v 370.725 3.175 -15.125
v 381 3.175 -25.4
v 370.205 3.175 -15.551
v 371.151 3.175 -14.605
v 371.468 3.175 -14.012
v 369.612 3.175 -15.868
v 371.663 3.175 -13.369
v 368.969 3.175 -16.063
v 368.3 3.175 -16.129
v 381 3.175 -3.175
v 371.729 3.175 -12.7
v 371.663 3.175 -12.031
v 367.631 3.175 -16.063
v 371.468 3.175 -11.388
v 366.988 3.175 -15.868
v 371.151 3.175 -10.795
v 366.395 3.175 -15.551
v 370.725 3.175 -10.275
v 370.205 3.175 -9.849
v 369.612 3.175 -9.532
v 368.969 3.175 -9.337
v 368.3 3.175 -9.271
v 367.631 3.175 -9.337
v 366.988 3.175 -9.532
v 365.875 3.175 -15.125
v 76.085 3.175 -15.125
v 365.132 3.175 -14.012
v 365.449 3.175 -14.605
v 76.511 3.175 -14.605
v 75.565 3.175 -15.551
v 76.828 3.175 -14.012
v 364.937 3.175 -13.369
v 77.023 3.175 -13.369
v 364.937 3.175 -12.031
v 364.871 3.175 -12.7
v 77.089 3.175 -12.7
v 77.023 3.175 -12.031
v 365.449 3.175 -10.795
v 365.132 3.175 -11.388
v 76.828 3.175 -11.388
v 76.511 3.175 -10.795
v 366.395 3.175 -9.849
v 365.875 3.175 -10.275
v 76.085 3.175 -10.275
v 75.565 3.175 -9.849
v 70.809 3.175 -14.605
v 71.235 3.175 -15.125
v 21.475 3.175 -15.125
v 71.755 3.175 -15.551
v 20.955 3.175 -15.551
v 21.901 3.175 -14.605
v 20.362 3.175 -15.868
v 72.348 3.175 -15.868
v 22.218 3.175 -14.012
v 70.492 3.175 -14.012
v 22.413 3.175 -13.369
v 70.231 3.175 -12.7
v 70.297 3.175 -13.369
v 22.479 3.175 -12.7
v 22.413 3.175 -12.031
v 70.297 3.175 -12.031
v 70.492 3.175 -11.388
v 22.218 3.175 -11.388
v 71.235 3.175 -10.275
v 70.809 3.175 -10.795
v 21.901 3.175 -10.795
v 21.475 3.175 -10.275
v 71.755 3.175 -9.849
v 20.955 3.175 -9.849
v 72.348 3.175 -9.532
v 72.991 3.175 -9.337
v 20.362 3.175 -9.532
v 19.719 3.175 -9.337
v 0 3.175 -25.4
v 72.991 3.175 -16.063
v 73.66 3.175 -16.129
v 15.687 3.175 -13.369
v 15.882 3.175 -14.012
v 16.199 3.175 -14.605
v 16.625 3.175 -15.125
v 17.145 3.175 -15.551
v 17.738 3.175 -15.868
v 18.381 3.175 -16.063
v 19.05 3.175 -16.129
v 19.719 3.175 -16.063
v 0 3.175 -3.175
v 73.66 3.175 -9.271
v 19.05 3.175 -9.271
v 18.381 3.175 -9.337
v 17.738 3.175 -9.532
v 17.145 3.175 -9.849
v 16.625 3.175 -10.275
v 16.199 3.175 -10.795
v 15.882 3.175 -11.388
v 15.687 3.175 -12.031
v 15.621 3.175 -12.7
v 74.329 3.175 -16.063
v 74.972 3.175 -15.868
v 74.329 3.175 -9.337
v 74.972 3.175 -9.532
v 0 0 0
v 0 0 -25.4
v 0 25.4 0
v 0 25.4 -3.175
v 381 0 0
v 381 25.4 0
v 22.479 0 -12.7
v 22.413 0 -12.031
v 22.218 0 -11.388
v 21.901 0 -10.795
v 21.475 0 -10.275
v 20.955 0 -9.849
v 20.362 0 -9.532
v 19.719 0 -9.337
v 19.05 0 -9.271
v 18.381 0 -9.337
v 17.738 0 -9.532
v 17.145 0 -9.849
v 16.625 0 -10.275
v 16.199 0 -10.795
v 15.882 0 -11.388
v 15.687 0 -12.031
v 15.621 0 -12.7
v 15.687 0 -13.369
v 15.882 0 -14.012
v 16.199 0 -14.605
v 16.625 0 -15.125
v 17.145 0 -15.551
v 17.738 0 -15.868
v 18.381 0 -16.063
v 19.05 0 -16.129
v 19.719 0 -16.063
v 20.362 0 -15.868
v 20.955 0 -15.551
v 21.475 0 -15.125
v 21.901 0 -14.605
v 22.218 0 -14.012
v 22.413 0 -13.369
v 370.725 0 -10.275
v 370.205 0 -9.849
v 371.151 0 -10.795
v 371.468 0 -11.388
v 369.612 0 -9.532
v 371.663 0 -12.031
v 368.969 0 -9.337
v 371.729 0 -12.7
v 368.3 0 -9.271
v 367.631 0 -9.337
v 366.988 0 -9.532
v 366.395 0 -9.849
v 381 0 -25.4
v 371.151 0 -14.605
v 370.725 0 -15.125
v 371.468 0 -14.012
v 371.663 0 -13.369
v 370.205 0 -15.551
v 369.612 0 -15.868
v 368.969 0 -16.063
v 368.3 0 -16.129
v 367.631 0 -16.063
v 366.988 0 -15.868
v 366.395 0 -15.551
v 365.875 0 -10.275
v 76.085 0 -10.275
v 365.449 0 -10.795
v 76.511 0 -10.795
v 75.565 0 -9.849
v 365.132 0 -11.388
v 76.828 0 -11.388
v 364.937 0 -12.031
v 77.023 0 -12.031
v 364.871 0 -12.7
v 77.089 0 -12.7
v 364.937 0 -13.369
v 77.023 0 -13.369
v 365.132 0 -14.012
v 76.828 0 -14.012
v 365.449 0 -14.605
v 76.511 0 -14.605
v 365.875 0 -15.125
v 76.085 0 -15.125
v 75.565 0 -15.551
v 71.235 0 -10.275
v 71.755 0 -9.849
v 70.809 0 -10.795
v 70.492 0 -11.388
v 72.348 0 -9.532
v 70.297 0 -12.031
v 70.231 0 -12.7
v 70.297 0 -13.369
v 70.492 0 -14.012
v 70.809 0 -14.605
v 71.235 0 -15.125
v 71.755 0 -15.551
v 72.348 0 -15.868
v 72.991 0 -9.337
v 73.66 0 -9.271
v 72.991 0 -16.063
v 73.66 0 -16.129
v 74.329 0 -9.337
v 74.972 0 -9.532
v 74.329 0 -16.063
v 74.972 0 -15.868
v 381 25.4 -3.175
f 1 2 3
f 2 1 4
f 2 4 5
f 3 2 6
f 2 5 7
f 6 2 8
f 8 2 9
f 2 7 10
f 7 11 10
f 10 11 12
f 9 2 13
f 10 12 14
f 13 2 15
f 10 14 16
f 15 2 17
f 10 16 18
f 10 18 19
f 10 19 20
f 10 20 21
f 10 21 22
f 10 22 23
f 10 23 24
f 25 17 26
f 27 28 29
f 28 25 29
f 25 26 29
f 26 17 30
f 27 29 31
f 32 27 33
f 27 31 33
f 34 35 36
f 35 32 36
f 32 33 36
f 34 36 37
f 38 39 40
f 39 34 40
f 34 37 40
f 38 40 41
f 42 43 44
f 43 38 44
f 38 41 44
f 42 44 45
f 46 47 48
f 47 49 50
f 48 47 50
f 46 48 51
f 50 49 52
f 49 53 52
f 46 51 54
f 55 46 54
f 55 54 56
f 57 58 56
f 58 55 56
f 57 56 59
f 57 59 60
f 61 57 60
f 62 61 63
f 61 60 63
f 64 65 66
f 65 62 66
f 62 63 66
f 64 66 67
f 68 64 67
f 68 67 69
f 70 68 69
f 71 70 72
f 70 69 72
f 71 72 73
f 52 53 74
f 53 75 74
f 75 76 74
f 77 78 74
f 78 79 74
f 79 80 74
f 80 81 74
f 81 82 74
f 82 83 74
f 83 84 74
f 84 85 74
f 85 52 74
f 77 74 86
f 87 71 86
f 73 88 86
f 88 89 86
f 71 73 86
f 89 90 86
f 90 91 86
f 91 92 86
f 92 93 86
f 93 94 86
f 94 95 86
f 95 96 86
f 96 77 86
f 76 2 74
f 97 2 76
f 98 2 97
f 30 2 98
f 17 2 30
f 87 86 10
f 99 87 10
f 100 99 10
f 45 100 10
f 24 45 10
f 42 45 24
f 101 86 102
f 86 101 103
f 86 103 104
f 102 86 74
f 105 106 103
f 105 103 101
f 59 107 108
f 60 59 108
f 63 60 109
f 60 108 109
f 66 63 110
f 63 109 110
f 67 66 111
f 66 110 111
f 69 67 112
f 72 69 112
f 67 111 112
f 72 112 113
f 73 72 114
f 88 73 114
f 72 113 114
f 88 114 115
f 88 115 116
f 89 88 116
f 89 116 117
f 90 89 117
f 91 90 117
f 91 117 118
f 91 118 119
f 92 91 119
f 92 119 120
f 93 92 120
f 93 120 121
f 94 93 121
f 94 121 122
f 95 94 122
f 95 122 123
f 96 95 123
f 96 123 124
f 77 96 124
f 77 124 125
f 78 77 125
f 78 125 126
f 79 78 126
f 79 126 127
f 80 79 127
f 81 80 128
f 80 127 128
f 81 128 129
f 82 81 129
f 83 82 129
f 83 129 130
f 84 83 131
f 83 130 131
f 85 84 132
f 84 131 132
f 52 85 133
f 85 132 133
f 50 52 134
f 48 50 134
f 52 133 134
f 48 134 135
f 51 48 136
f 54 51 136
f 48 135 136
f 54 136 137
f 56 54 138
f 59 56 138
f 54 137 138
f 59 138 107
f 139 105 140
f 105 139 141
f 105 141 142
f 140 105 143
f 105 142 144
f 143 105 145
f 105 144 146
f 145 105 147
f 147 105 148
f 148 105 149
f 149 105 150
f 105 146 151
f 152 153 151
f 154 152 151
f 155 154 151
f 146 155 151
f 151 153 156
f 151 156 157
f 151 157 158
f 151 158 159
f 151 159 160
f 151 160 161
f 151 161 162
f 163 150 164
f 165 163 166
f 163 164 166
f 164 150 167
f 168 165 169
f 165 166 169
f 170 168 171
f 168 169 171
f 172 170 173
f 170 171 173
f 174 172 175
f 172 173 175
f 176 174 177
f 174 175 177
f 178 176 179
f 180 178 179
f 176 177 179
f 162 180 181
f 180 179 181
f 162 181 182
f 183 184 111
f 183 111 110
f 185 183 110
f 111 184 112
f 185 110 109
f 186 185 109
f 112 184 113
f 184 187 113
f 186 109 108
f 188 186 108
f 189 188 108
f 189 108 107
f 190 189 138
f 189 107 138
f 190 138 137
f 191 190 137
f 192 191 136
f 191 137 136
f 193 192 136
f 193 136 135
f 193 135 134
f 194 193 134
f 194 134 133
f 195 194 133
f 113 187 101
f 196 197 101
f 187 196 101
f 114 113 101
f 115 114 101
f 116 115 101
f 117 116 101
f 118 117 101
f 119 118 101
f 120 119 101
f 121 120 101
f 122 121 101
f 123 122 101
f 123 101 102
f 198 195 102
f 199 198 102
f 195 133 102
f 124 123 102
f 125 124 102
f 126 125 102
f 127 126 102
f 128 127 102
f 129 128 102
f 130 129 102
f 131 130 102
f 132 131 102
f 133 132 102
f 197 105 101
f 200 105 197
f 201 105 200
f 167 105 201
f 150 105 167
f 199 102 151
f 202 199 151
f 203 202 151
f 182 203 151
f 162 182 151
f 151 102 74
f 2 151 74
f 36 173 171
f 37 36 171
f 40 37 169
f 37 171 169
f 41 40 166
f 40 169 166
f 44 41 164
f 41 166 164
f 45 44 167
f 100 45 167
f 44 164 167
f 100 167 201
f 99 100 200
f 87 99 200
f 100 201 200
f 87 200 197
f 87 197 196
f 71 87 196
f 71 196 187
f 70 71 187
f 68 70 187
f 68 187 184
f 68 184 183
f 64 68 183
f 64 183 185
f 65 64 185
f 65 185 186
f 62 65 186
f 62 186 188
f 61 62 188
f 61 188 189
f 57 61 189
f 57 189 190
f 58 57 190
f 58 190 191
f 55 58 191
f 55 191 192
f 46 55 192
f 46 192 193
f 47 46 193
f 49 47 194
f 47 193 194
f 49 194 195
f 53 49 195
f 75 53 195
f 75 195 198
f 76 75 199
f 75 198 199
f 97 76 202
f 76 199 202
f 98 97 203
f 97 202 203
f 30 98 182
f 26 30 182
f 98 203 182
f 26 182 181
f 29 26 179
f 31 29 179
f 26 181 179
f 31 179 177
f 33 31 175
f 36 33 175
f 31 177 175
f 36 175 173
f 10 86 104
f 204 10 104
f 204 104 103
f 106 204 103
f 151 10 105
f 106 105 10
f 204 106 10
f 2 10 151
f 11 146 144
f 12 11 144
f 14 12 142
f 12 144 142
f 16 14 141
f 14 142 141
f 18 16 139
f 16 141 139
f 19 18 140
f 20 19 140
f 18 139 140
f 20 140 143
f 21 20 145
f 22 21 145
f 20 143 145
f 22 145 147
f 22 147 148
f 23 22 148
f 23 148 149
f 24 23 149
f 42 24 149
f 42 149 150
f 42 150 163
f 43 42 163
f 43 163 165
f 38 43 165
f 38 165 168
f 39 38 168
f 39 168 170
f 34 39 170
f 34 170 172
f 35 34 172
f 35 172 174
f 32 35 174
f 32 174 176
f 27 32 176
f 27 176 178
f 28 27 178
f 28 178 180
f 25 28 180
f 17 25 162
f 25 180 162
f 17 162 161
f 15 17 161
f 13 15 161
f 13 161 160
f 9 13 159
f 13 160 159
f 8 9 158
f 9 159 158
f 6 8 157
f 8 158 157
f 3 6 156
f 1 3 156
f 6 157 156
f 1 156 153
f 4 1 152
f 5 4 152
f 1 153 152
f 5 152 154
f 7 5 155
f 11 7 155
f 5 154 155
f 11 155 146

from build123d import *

# Parameters (mm, degrees)
BOSS_EXTRUDE1_DEPTH = 381
CUT_EXTRUDE1_REACH  = 27.4
SKETCH2_R           = 3.429


with BuildPart() as part:
    # Sketch1 → Boss-Extrude1 (new body)
    with BuildSketch(Plane(origin=(0, 0, 0), x_dir=(0, 0, -1), z_dir=(1, 0, 0))):
        Polygon((0, 0), (25.4, 0), (25.4, 3.175), (3.175, 3.175), (3.175, 25.4), (0, 25.4), align=None)
    extrude(amount=BOSS_EXTRUDE1_DEPTH)

    # Sketch2 → Cut-Extrude1 (cut, up to next)
    with BuildSketch(Plane.XZ, mode=Mode.PRIVATE) as cut_extrude1_sk1:
        with Locations((73.66, -12.7)):
            Circle(SKETCH2_R)
    cut_extrude1_tool1 = extrude(cut_extrude1_sk1.sketch, amount=-CUT_EXTRUDE1_REACH, mode=Mode.PRIVATE) & part.part
    add(cut_extrude1_tool1.solids().sort_by_distance((73.66, 0, -12.7))[0], mode=Mode.SUBTRACT)
    # Sketch2 → Cut-Extrude1 (cut, up to next)
    with BuildSketch(Plane.XZ, mode=Mode.PRIVATE) as cut_extrude1_sk2:
        with Locations((368.3, -12.7)):
            Circle(SKETCH2_R)
    cut_extrude1_tool2 = extrude(cut_extrude1_sk2.sketch, amount=-CUT_EXTRUDE1_REACH, mode=Mode.PRIVATE) & part.part
    add(cut_extrude1_tool2.solids().sort_by_distance((368.3, 0, -12.7))[0], mode=Mode.SUBTRACT)
    # Sketch2 → Cut-Extrude1 (cut, up to next)
    with BuildSketch(Plane.XZ, mode=Mode.PRIVATE) as cut_extrude1_sk3:
        with Locations((19.05, -12.7)):
            Circle(SKETCH2_R)
    cut_extrude1_tool3 = extrude(cut_extrude1_sk3.sketch, amount=-CUT_EXTRUDE1_REACH, mode=Mode.PRIVATE) & part.part
    add(cut_extrude1_tool3.solids().sort_by_distance((19.05, 0, -12.7))[0], mode=Mode.SUBTRACT)


solid = part.part
